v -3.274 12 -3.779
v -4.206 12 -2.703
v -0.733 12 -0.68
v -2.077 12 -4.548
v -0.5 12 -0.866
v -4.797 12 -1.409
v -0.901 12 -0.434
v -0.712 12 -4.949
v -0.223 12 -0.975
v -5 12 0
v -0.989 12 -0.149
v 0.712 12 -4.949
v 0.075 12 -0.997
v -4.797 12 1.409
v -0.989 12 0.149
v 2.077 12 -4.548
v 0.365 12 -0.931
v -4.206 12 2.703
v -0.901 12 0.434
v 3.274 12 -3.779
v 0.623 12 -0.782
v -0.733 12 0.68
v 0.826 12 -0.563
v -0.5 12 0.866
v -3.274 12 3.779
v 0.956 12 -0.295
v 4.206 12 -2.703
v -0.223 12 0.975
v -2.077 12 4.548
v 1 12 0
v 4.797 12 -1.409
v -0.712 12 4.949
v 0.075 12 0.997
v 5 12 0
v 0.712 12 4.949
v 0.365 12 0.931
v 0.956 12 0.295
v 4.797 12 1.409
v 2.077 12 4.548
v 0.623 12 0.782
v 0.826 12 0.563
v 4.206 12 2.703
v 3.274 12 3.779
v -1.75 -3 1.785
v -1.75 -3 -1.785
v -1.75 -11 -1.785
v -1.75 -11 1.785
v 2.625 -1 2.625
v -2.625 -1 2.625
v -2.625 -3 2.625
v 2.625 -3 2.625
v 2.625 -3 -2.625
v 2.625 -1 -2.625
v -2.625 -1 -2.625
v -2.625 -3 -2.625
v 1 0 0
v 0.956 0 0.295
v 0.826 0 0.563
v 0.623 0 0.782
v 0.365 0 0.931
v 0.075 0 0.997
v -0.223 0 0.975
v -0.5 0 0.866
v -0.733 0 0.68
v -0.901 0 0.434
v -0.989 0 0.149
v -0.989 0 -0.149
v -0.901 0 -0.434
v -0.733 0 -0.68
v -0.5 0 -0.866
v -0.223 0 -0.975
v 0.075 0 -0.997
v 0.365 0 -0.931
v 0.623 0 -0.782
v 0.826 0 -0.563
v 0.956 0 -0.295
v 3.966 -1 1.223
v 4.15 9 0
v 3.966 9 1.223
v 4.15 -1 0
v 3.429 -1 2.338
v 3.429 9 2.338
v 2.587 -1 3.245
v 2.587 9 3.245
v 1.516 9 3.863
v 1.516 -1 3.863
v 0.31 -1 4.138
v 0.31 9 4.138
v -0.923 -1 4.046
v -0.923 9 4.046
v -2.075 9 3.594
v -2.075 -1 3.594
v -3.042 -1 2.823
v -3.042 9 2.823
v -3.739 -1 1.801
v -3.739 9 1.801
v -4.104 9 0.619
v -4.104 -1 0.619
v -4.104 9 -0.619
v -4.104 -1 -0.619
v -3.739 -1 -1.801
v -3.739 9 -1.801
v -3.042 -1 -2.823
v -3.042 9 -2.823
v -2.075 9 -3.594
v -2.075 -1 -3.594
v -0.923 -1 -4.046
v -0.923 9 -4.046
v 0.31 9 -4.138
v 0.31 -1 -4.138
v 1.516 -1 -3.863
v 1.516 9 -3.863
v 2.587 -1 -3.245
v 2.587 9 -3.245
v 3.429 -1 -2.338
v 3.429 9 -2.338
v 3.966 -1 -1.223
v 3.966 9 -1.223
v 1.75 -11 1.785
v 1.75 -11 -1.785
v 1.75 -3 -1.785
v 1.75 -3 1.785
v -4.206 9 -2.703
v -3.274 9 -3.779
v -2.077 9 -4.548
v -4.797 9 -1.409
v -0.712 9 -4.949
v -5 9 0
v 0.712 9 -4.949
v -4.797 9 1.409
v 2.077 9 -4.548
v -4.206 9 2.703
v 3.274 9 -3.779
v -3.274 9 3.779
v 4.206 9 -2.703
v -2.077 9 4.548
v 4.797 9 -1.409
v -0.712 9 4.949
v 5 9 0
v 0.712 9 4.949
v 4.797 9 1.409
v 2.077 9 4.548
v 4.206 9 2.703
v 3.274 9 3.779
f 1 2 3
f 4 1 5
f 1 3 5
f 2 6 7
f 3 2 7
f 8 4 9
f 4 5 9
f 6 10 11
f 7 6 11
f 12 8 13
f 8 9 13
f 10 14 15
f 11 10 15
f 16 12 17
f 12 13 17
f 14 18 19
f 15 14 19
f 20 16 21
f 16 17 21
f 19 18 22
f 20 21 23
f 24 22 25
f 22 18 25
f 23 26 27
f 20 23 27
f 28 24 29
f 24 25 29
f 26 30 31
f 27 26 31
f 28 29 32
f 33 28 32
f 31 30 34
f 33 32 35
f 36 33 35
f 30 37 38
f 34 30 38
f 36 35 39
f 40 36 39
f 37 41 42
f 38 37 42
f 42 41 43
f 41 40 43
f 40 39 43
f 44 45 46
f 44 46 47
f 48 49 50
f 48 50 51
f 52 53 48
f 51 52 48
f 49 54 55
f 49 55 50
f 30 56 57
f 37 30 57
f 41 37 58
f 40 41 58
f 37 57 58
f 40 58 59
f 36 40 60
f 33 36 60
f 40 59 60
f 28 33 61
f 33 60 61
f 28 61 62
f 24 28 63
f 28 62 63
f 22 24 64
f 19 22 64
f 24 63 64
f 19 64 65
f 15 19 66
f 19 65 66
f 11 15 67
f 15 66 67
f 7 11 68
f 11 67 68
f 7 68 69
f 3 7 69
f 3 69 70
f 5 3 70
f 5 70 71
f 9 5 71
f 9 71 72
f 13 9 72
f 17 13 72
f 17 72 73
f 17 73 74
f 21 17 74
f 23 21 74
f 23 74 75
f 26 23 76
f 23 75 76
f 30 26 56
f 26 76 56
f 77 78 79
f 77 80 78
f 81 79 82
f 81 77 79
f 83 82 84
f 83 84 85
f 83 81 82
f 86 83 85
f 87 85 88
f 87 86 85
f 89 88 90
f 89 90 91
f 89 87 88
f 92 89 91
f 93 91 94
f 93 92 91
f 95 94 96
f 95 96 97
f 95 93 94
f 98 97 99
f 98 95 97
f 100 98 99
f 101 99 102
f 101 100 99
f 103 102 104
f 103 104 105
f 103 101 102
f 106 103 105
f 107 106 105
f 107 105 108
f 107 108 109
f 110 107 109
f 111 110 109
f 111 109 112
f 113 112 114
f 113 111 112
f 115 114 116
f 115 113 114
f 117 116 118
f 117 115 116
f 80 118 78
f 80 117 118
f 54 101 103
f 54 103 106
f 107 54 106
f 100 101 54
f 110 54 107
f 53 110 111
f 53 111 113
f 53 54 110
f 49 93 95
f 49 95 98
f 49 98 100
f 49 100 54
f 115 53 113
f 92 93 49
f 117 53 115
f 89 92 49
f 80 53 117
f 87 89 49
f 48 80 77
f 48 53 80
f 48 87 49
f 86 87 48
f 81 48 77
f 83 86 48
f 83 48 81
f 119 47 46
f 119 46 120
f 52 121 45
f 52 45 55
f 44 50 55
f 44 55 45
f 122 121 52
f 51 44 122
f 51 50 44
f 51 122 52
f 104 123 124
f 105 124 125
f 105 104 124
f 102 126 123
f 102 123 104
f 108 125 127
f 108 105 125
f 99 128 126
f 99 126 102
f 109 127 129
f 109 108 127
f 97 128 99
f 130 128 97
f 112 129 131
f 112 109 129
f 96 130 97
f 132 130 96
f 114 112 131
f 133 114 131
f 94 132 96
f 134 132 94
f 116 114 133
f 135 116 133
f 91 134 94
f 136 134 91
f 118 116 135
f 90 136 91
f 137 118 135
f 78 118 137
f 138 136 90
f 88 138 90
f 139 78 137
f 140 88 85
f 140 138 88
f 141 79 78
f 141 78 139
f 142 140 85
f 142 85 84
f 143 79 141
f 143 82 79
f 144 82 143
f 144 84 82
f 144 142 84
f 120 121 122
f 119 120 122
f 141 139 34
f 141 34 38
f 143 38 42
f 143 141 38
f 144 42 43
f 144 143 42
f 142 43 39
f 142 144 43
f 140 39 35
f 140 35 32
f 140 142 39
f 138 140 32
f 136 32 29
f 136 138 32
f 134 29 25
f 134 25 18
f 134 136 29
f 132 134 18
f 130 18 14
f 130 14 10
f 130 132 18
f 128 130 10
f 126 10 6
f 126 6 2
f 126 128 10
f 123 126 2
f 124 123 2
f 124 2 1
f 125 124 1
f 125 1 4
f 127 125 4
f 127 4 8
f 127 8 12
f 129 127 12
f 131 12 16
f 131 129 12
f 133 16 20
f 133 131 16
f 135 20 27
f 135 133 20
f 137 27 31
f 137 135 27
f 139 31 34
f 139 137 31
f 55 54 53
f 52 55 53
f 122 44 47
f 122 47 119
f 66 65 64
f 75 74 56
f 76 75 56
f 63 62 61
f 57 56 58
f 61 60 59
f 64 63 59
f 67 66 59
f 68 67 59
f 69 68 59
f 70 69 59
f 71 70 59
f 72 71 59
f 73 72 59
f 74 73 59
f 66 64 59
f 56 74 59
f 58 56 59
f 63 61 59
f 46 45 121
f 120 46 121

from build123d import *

# Parameters (mm, degrees)
F0_W          = 3.5
F0_H          = 3.5707142143
F0_R          = 1
F1_DEPTH      = 11
F0_W_2        = 5.25
F0_H_2        = 5.25
F2_DEPTH      = 3
F0_R_2        = 4.15
F3_DEPTH      = 8
F3_DEPTH_BACK = 1
F4_DEPTH      = 12
F5_DEPTH      = 4
F6_START      = -9
F0_R_3        = 5
F6_DEPTH      = 3


with BuildPart() as f1:
    # F0 (on Front) → F1 (new body)
    with BuildSketch(Plane.XZ):
        Rectangle(F0_W, F0_H)
        Circle(F0_R, mode=Mode.SUBTRACT)
        Circle(F0_R)
    extrude(amount=F1_DEPTH)

    # F0 (on Front) → F2 (join)
    with BuildSketch(Plane.XZ):
        Rectangle(F0_W_2, F0_H_2)
        with BuildLine():
            ThreePointArc((1.75, 1.7853571071), (2.3048861143, 0.9682458366), (2.5, 0))
            ThreePointArc((2.5, 0), (2.3048861143, -0.9682458366), (1.75, -1.7853571071))
            ThreePointArc((1.75, -1.7853571071), (0, -2.5), (-1.75, -1.7853571071))
            ThreePointArc((-1.75, -1.7853571071), (-2.5, 0), (-1.75, 1.7853571071))
            ThreePointArc((-1.75, 1.7853571071), (0, 2.5), (1.75, 1.7853571071))
        make_face(mode=Mode.SUBTRACT)
        with BuildLine():
            Line((-1.75, -1.7853571071), (-1.75, 1.7853571071))
            ThreePointArc((-1.75, 1.7853571071), (-2.5, 0), (-1.75, -1.7853571071))
        make_face()
        with BuildLine():
            ThreePointArc((1.75, -1.7853571071), (2.3048861143, -0.9682458366), (2.5, 0))
            ThreePointArc((2.5, 0), (2.3048861143, 0.9682458366), (1.75, 1.7853571071))
            Line((1.75, 1.7853571071), (1.75, -1.7853571071))
        make_face()
        with BuildLine():
            ThreePointArc((-1.75, -1.7853571071), (0, -2.5), (1.75, -1.7853571071))
            Line((1.75, -1.7853571071), (-1.75, -1.7853571071))
        make_face()
        with BuildLine():
            Line((-1.75, 1.7853571071), (1.75, 1.7853571071))
            ThreePointArc((1.75, 1.7853571071), (0, 2.5), (-1.75, 1.7853571071))
        make_face()
    extrude(amount=F2_DEPTH)

    # F0 (on Front) → F3 (join, two sides)
    with BuildSketch(Plane.XZ) as f3_sk:
        Circle(F0_R_2)
        Rectangle(F0_W_2, F0_H_2, mode=Mode.SUBTRACT)
    extrude(amount=-F3_DEPTH)
    extrude(f3_sk.sketch, amount=F3_DEPTH_BACK)

    # F0 (on Front) → F4 (join)
    with BuildSketch(Plane.XZ):
        Rectangle(F0_W_2, F0_H_2)
        with BuildLine():
            ThreePointArc((1.75, 1.7853571071), (2.3048861143, 0.9682458366), (2.5, 0))
            ThreePointArc((2.5, 0), (2.3048861143, -0.9682458366), (1.75, -1.7853571071))
            ThreePointArc((1.75, -1.7853571071), (0, -2.5), (-1.75, -1.7853571071))
            ThreePointArc((-1.75, -1.7853571071), (-2.5, 0), (-1.75, 1.7853571071))
            ThreePointArc((-1.75, 1.7853571071), (0, 2.5), (1.75, 1.7853571071))
        make_face(mode=Mode.SUBTRACT)
        Rectangle(F0_W, F0_H)
        Circle(F0_R, mode=Mode.SUBTRACT)
        with BuildLine():
            Line((-1.75, -1.7853571071), (-1.75, 1.7853571071))
            ThreePointArc((-1.75, 1.7853571071), (-2.5, 0), (-1.75, -1.7853571071))
        make_face()
        with BuildLine():
            ThreePointArc((1.75, -1.7853571071), (2.3048861143, -0.9682458366), (2.5, 0))
            ThreePointArc((2.5, 0), (2.3048861143, 0.9682458366), (1.75, 1.7853571071))
            Line((1.75, 1.7853571071), (1.75, -1.7853571071))
        make_face()
        with BuildLine():
            Line((-1.75, 1.7853571071), (1.75, 1.7853571071))
            ThreePointArc((1.75, 1.7853571071), (0, 2.5), (-1.75, 1.7853571071))
        make_face()
        with BuildLine():
            ThreePointArc((-1.75, -1.7853571071), (0, -2.5), (1.75, -1.7853571071))
            Line((1.75, -1.7853571071), (-1.75, -1.7853571071))
        make_face()
    extrude(amount=-F4_DEPTH)

    # F5 (add): a face of the model
    f5_faces = [f1.faces().sort_by_distance(p)[0] for p in [
        (-4.0326202743, 8, 0),
    ]]
    extrude(f5_faces, amount=F5_DEPTH)

    # F0 (on Front) → F6 (join)
    with BuildSketch(Plane.XZ.offset(F6_START)):
        Circle(F0_R_3)
        Circle(F0_R_2, mode=Mode.SUBTRACT)
    extrude(amount=-F6_DEPTH)


solid = f1.part
